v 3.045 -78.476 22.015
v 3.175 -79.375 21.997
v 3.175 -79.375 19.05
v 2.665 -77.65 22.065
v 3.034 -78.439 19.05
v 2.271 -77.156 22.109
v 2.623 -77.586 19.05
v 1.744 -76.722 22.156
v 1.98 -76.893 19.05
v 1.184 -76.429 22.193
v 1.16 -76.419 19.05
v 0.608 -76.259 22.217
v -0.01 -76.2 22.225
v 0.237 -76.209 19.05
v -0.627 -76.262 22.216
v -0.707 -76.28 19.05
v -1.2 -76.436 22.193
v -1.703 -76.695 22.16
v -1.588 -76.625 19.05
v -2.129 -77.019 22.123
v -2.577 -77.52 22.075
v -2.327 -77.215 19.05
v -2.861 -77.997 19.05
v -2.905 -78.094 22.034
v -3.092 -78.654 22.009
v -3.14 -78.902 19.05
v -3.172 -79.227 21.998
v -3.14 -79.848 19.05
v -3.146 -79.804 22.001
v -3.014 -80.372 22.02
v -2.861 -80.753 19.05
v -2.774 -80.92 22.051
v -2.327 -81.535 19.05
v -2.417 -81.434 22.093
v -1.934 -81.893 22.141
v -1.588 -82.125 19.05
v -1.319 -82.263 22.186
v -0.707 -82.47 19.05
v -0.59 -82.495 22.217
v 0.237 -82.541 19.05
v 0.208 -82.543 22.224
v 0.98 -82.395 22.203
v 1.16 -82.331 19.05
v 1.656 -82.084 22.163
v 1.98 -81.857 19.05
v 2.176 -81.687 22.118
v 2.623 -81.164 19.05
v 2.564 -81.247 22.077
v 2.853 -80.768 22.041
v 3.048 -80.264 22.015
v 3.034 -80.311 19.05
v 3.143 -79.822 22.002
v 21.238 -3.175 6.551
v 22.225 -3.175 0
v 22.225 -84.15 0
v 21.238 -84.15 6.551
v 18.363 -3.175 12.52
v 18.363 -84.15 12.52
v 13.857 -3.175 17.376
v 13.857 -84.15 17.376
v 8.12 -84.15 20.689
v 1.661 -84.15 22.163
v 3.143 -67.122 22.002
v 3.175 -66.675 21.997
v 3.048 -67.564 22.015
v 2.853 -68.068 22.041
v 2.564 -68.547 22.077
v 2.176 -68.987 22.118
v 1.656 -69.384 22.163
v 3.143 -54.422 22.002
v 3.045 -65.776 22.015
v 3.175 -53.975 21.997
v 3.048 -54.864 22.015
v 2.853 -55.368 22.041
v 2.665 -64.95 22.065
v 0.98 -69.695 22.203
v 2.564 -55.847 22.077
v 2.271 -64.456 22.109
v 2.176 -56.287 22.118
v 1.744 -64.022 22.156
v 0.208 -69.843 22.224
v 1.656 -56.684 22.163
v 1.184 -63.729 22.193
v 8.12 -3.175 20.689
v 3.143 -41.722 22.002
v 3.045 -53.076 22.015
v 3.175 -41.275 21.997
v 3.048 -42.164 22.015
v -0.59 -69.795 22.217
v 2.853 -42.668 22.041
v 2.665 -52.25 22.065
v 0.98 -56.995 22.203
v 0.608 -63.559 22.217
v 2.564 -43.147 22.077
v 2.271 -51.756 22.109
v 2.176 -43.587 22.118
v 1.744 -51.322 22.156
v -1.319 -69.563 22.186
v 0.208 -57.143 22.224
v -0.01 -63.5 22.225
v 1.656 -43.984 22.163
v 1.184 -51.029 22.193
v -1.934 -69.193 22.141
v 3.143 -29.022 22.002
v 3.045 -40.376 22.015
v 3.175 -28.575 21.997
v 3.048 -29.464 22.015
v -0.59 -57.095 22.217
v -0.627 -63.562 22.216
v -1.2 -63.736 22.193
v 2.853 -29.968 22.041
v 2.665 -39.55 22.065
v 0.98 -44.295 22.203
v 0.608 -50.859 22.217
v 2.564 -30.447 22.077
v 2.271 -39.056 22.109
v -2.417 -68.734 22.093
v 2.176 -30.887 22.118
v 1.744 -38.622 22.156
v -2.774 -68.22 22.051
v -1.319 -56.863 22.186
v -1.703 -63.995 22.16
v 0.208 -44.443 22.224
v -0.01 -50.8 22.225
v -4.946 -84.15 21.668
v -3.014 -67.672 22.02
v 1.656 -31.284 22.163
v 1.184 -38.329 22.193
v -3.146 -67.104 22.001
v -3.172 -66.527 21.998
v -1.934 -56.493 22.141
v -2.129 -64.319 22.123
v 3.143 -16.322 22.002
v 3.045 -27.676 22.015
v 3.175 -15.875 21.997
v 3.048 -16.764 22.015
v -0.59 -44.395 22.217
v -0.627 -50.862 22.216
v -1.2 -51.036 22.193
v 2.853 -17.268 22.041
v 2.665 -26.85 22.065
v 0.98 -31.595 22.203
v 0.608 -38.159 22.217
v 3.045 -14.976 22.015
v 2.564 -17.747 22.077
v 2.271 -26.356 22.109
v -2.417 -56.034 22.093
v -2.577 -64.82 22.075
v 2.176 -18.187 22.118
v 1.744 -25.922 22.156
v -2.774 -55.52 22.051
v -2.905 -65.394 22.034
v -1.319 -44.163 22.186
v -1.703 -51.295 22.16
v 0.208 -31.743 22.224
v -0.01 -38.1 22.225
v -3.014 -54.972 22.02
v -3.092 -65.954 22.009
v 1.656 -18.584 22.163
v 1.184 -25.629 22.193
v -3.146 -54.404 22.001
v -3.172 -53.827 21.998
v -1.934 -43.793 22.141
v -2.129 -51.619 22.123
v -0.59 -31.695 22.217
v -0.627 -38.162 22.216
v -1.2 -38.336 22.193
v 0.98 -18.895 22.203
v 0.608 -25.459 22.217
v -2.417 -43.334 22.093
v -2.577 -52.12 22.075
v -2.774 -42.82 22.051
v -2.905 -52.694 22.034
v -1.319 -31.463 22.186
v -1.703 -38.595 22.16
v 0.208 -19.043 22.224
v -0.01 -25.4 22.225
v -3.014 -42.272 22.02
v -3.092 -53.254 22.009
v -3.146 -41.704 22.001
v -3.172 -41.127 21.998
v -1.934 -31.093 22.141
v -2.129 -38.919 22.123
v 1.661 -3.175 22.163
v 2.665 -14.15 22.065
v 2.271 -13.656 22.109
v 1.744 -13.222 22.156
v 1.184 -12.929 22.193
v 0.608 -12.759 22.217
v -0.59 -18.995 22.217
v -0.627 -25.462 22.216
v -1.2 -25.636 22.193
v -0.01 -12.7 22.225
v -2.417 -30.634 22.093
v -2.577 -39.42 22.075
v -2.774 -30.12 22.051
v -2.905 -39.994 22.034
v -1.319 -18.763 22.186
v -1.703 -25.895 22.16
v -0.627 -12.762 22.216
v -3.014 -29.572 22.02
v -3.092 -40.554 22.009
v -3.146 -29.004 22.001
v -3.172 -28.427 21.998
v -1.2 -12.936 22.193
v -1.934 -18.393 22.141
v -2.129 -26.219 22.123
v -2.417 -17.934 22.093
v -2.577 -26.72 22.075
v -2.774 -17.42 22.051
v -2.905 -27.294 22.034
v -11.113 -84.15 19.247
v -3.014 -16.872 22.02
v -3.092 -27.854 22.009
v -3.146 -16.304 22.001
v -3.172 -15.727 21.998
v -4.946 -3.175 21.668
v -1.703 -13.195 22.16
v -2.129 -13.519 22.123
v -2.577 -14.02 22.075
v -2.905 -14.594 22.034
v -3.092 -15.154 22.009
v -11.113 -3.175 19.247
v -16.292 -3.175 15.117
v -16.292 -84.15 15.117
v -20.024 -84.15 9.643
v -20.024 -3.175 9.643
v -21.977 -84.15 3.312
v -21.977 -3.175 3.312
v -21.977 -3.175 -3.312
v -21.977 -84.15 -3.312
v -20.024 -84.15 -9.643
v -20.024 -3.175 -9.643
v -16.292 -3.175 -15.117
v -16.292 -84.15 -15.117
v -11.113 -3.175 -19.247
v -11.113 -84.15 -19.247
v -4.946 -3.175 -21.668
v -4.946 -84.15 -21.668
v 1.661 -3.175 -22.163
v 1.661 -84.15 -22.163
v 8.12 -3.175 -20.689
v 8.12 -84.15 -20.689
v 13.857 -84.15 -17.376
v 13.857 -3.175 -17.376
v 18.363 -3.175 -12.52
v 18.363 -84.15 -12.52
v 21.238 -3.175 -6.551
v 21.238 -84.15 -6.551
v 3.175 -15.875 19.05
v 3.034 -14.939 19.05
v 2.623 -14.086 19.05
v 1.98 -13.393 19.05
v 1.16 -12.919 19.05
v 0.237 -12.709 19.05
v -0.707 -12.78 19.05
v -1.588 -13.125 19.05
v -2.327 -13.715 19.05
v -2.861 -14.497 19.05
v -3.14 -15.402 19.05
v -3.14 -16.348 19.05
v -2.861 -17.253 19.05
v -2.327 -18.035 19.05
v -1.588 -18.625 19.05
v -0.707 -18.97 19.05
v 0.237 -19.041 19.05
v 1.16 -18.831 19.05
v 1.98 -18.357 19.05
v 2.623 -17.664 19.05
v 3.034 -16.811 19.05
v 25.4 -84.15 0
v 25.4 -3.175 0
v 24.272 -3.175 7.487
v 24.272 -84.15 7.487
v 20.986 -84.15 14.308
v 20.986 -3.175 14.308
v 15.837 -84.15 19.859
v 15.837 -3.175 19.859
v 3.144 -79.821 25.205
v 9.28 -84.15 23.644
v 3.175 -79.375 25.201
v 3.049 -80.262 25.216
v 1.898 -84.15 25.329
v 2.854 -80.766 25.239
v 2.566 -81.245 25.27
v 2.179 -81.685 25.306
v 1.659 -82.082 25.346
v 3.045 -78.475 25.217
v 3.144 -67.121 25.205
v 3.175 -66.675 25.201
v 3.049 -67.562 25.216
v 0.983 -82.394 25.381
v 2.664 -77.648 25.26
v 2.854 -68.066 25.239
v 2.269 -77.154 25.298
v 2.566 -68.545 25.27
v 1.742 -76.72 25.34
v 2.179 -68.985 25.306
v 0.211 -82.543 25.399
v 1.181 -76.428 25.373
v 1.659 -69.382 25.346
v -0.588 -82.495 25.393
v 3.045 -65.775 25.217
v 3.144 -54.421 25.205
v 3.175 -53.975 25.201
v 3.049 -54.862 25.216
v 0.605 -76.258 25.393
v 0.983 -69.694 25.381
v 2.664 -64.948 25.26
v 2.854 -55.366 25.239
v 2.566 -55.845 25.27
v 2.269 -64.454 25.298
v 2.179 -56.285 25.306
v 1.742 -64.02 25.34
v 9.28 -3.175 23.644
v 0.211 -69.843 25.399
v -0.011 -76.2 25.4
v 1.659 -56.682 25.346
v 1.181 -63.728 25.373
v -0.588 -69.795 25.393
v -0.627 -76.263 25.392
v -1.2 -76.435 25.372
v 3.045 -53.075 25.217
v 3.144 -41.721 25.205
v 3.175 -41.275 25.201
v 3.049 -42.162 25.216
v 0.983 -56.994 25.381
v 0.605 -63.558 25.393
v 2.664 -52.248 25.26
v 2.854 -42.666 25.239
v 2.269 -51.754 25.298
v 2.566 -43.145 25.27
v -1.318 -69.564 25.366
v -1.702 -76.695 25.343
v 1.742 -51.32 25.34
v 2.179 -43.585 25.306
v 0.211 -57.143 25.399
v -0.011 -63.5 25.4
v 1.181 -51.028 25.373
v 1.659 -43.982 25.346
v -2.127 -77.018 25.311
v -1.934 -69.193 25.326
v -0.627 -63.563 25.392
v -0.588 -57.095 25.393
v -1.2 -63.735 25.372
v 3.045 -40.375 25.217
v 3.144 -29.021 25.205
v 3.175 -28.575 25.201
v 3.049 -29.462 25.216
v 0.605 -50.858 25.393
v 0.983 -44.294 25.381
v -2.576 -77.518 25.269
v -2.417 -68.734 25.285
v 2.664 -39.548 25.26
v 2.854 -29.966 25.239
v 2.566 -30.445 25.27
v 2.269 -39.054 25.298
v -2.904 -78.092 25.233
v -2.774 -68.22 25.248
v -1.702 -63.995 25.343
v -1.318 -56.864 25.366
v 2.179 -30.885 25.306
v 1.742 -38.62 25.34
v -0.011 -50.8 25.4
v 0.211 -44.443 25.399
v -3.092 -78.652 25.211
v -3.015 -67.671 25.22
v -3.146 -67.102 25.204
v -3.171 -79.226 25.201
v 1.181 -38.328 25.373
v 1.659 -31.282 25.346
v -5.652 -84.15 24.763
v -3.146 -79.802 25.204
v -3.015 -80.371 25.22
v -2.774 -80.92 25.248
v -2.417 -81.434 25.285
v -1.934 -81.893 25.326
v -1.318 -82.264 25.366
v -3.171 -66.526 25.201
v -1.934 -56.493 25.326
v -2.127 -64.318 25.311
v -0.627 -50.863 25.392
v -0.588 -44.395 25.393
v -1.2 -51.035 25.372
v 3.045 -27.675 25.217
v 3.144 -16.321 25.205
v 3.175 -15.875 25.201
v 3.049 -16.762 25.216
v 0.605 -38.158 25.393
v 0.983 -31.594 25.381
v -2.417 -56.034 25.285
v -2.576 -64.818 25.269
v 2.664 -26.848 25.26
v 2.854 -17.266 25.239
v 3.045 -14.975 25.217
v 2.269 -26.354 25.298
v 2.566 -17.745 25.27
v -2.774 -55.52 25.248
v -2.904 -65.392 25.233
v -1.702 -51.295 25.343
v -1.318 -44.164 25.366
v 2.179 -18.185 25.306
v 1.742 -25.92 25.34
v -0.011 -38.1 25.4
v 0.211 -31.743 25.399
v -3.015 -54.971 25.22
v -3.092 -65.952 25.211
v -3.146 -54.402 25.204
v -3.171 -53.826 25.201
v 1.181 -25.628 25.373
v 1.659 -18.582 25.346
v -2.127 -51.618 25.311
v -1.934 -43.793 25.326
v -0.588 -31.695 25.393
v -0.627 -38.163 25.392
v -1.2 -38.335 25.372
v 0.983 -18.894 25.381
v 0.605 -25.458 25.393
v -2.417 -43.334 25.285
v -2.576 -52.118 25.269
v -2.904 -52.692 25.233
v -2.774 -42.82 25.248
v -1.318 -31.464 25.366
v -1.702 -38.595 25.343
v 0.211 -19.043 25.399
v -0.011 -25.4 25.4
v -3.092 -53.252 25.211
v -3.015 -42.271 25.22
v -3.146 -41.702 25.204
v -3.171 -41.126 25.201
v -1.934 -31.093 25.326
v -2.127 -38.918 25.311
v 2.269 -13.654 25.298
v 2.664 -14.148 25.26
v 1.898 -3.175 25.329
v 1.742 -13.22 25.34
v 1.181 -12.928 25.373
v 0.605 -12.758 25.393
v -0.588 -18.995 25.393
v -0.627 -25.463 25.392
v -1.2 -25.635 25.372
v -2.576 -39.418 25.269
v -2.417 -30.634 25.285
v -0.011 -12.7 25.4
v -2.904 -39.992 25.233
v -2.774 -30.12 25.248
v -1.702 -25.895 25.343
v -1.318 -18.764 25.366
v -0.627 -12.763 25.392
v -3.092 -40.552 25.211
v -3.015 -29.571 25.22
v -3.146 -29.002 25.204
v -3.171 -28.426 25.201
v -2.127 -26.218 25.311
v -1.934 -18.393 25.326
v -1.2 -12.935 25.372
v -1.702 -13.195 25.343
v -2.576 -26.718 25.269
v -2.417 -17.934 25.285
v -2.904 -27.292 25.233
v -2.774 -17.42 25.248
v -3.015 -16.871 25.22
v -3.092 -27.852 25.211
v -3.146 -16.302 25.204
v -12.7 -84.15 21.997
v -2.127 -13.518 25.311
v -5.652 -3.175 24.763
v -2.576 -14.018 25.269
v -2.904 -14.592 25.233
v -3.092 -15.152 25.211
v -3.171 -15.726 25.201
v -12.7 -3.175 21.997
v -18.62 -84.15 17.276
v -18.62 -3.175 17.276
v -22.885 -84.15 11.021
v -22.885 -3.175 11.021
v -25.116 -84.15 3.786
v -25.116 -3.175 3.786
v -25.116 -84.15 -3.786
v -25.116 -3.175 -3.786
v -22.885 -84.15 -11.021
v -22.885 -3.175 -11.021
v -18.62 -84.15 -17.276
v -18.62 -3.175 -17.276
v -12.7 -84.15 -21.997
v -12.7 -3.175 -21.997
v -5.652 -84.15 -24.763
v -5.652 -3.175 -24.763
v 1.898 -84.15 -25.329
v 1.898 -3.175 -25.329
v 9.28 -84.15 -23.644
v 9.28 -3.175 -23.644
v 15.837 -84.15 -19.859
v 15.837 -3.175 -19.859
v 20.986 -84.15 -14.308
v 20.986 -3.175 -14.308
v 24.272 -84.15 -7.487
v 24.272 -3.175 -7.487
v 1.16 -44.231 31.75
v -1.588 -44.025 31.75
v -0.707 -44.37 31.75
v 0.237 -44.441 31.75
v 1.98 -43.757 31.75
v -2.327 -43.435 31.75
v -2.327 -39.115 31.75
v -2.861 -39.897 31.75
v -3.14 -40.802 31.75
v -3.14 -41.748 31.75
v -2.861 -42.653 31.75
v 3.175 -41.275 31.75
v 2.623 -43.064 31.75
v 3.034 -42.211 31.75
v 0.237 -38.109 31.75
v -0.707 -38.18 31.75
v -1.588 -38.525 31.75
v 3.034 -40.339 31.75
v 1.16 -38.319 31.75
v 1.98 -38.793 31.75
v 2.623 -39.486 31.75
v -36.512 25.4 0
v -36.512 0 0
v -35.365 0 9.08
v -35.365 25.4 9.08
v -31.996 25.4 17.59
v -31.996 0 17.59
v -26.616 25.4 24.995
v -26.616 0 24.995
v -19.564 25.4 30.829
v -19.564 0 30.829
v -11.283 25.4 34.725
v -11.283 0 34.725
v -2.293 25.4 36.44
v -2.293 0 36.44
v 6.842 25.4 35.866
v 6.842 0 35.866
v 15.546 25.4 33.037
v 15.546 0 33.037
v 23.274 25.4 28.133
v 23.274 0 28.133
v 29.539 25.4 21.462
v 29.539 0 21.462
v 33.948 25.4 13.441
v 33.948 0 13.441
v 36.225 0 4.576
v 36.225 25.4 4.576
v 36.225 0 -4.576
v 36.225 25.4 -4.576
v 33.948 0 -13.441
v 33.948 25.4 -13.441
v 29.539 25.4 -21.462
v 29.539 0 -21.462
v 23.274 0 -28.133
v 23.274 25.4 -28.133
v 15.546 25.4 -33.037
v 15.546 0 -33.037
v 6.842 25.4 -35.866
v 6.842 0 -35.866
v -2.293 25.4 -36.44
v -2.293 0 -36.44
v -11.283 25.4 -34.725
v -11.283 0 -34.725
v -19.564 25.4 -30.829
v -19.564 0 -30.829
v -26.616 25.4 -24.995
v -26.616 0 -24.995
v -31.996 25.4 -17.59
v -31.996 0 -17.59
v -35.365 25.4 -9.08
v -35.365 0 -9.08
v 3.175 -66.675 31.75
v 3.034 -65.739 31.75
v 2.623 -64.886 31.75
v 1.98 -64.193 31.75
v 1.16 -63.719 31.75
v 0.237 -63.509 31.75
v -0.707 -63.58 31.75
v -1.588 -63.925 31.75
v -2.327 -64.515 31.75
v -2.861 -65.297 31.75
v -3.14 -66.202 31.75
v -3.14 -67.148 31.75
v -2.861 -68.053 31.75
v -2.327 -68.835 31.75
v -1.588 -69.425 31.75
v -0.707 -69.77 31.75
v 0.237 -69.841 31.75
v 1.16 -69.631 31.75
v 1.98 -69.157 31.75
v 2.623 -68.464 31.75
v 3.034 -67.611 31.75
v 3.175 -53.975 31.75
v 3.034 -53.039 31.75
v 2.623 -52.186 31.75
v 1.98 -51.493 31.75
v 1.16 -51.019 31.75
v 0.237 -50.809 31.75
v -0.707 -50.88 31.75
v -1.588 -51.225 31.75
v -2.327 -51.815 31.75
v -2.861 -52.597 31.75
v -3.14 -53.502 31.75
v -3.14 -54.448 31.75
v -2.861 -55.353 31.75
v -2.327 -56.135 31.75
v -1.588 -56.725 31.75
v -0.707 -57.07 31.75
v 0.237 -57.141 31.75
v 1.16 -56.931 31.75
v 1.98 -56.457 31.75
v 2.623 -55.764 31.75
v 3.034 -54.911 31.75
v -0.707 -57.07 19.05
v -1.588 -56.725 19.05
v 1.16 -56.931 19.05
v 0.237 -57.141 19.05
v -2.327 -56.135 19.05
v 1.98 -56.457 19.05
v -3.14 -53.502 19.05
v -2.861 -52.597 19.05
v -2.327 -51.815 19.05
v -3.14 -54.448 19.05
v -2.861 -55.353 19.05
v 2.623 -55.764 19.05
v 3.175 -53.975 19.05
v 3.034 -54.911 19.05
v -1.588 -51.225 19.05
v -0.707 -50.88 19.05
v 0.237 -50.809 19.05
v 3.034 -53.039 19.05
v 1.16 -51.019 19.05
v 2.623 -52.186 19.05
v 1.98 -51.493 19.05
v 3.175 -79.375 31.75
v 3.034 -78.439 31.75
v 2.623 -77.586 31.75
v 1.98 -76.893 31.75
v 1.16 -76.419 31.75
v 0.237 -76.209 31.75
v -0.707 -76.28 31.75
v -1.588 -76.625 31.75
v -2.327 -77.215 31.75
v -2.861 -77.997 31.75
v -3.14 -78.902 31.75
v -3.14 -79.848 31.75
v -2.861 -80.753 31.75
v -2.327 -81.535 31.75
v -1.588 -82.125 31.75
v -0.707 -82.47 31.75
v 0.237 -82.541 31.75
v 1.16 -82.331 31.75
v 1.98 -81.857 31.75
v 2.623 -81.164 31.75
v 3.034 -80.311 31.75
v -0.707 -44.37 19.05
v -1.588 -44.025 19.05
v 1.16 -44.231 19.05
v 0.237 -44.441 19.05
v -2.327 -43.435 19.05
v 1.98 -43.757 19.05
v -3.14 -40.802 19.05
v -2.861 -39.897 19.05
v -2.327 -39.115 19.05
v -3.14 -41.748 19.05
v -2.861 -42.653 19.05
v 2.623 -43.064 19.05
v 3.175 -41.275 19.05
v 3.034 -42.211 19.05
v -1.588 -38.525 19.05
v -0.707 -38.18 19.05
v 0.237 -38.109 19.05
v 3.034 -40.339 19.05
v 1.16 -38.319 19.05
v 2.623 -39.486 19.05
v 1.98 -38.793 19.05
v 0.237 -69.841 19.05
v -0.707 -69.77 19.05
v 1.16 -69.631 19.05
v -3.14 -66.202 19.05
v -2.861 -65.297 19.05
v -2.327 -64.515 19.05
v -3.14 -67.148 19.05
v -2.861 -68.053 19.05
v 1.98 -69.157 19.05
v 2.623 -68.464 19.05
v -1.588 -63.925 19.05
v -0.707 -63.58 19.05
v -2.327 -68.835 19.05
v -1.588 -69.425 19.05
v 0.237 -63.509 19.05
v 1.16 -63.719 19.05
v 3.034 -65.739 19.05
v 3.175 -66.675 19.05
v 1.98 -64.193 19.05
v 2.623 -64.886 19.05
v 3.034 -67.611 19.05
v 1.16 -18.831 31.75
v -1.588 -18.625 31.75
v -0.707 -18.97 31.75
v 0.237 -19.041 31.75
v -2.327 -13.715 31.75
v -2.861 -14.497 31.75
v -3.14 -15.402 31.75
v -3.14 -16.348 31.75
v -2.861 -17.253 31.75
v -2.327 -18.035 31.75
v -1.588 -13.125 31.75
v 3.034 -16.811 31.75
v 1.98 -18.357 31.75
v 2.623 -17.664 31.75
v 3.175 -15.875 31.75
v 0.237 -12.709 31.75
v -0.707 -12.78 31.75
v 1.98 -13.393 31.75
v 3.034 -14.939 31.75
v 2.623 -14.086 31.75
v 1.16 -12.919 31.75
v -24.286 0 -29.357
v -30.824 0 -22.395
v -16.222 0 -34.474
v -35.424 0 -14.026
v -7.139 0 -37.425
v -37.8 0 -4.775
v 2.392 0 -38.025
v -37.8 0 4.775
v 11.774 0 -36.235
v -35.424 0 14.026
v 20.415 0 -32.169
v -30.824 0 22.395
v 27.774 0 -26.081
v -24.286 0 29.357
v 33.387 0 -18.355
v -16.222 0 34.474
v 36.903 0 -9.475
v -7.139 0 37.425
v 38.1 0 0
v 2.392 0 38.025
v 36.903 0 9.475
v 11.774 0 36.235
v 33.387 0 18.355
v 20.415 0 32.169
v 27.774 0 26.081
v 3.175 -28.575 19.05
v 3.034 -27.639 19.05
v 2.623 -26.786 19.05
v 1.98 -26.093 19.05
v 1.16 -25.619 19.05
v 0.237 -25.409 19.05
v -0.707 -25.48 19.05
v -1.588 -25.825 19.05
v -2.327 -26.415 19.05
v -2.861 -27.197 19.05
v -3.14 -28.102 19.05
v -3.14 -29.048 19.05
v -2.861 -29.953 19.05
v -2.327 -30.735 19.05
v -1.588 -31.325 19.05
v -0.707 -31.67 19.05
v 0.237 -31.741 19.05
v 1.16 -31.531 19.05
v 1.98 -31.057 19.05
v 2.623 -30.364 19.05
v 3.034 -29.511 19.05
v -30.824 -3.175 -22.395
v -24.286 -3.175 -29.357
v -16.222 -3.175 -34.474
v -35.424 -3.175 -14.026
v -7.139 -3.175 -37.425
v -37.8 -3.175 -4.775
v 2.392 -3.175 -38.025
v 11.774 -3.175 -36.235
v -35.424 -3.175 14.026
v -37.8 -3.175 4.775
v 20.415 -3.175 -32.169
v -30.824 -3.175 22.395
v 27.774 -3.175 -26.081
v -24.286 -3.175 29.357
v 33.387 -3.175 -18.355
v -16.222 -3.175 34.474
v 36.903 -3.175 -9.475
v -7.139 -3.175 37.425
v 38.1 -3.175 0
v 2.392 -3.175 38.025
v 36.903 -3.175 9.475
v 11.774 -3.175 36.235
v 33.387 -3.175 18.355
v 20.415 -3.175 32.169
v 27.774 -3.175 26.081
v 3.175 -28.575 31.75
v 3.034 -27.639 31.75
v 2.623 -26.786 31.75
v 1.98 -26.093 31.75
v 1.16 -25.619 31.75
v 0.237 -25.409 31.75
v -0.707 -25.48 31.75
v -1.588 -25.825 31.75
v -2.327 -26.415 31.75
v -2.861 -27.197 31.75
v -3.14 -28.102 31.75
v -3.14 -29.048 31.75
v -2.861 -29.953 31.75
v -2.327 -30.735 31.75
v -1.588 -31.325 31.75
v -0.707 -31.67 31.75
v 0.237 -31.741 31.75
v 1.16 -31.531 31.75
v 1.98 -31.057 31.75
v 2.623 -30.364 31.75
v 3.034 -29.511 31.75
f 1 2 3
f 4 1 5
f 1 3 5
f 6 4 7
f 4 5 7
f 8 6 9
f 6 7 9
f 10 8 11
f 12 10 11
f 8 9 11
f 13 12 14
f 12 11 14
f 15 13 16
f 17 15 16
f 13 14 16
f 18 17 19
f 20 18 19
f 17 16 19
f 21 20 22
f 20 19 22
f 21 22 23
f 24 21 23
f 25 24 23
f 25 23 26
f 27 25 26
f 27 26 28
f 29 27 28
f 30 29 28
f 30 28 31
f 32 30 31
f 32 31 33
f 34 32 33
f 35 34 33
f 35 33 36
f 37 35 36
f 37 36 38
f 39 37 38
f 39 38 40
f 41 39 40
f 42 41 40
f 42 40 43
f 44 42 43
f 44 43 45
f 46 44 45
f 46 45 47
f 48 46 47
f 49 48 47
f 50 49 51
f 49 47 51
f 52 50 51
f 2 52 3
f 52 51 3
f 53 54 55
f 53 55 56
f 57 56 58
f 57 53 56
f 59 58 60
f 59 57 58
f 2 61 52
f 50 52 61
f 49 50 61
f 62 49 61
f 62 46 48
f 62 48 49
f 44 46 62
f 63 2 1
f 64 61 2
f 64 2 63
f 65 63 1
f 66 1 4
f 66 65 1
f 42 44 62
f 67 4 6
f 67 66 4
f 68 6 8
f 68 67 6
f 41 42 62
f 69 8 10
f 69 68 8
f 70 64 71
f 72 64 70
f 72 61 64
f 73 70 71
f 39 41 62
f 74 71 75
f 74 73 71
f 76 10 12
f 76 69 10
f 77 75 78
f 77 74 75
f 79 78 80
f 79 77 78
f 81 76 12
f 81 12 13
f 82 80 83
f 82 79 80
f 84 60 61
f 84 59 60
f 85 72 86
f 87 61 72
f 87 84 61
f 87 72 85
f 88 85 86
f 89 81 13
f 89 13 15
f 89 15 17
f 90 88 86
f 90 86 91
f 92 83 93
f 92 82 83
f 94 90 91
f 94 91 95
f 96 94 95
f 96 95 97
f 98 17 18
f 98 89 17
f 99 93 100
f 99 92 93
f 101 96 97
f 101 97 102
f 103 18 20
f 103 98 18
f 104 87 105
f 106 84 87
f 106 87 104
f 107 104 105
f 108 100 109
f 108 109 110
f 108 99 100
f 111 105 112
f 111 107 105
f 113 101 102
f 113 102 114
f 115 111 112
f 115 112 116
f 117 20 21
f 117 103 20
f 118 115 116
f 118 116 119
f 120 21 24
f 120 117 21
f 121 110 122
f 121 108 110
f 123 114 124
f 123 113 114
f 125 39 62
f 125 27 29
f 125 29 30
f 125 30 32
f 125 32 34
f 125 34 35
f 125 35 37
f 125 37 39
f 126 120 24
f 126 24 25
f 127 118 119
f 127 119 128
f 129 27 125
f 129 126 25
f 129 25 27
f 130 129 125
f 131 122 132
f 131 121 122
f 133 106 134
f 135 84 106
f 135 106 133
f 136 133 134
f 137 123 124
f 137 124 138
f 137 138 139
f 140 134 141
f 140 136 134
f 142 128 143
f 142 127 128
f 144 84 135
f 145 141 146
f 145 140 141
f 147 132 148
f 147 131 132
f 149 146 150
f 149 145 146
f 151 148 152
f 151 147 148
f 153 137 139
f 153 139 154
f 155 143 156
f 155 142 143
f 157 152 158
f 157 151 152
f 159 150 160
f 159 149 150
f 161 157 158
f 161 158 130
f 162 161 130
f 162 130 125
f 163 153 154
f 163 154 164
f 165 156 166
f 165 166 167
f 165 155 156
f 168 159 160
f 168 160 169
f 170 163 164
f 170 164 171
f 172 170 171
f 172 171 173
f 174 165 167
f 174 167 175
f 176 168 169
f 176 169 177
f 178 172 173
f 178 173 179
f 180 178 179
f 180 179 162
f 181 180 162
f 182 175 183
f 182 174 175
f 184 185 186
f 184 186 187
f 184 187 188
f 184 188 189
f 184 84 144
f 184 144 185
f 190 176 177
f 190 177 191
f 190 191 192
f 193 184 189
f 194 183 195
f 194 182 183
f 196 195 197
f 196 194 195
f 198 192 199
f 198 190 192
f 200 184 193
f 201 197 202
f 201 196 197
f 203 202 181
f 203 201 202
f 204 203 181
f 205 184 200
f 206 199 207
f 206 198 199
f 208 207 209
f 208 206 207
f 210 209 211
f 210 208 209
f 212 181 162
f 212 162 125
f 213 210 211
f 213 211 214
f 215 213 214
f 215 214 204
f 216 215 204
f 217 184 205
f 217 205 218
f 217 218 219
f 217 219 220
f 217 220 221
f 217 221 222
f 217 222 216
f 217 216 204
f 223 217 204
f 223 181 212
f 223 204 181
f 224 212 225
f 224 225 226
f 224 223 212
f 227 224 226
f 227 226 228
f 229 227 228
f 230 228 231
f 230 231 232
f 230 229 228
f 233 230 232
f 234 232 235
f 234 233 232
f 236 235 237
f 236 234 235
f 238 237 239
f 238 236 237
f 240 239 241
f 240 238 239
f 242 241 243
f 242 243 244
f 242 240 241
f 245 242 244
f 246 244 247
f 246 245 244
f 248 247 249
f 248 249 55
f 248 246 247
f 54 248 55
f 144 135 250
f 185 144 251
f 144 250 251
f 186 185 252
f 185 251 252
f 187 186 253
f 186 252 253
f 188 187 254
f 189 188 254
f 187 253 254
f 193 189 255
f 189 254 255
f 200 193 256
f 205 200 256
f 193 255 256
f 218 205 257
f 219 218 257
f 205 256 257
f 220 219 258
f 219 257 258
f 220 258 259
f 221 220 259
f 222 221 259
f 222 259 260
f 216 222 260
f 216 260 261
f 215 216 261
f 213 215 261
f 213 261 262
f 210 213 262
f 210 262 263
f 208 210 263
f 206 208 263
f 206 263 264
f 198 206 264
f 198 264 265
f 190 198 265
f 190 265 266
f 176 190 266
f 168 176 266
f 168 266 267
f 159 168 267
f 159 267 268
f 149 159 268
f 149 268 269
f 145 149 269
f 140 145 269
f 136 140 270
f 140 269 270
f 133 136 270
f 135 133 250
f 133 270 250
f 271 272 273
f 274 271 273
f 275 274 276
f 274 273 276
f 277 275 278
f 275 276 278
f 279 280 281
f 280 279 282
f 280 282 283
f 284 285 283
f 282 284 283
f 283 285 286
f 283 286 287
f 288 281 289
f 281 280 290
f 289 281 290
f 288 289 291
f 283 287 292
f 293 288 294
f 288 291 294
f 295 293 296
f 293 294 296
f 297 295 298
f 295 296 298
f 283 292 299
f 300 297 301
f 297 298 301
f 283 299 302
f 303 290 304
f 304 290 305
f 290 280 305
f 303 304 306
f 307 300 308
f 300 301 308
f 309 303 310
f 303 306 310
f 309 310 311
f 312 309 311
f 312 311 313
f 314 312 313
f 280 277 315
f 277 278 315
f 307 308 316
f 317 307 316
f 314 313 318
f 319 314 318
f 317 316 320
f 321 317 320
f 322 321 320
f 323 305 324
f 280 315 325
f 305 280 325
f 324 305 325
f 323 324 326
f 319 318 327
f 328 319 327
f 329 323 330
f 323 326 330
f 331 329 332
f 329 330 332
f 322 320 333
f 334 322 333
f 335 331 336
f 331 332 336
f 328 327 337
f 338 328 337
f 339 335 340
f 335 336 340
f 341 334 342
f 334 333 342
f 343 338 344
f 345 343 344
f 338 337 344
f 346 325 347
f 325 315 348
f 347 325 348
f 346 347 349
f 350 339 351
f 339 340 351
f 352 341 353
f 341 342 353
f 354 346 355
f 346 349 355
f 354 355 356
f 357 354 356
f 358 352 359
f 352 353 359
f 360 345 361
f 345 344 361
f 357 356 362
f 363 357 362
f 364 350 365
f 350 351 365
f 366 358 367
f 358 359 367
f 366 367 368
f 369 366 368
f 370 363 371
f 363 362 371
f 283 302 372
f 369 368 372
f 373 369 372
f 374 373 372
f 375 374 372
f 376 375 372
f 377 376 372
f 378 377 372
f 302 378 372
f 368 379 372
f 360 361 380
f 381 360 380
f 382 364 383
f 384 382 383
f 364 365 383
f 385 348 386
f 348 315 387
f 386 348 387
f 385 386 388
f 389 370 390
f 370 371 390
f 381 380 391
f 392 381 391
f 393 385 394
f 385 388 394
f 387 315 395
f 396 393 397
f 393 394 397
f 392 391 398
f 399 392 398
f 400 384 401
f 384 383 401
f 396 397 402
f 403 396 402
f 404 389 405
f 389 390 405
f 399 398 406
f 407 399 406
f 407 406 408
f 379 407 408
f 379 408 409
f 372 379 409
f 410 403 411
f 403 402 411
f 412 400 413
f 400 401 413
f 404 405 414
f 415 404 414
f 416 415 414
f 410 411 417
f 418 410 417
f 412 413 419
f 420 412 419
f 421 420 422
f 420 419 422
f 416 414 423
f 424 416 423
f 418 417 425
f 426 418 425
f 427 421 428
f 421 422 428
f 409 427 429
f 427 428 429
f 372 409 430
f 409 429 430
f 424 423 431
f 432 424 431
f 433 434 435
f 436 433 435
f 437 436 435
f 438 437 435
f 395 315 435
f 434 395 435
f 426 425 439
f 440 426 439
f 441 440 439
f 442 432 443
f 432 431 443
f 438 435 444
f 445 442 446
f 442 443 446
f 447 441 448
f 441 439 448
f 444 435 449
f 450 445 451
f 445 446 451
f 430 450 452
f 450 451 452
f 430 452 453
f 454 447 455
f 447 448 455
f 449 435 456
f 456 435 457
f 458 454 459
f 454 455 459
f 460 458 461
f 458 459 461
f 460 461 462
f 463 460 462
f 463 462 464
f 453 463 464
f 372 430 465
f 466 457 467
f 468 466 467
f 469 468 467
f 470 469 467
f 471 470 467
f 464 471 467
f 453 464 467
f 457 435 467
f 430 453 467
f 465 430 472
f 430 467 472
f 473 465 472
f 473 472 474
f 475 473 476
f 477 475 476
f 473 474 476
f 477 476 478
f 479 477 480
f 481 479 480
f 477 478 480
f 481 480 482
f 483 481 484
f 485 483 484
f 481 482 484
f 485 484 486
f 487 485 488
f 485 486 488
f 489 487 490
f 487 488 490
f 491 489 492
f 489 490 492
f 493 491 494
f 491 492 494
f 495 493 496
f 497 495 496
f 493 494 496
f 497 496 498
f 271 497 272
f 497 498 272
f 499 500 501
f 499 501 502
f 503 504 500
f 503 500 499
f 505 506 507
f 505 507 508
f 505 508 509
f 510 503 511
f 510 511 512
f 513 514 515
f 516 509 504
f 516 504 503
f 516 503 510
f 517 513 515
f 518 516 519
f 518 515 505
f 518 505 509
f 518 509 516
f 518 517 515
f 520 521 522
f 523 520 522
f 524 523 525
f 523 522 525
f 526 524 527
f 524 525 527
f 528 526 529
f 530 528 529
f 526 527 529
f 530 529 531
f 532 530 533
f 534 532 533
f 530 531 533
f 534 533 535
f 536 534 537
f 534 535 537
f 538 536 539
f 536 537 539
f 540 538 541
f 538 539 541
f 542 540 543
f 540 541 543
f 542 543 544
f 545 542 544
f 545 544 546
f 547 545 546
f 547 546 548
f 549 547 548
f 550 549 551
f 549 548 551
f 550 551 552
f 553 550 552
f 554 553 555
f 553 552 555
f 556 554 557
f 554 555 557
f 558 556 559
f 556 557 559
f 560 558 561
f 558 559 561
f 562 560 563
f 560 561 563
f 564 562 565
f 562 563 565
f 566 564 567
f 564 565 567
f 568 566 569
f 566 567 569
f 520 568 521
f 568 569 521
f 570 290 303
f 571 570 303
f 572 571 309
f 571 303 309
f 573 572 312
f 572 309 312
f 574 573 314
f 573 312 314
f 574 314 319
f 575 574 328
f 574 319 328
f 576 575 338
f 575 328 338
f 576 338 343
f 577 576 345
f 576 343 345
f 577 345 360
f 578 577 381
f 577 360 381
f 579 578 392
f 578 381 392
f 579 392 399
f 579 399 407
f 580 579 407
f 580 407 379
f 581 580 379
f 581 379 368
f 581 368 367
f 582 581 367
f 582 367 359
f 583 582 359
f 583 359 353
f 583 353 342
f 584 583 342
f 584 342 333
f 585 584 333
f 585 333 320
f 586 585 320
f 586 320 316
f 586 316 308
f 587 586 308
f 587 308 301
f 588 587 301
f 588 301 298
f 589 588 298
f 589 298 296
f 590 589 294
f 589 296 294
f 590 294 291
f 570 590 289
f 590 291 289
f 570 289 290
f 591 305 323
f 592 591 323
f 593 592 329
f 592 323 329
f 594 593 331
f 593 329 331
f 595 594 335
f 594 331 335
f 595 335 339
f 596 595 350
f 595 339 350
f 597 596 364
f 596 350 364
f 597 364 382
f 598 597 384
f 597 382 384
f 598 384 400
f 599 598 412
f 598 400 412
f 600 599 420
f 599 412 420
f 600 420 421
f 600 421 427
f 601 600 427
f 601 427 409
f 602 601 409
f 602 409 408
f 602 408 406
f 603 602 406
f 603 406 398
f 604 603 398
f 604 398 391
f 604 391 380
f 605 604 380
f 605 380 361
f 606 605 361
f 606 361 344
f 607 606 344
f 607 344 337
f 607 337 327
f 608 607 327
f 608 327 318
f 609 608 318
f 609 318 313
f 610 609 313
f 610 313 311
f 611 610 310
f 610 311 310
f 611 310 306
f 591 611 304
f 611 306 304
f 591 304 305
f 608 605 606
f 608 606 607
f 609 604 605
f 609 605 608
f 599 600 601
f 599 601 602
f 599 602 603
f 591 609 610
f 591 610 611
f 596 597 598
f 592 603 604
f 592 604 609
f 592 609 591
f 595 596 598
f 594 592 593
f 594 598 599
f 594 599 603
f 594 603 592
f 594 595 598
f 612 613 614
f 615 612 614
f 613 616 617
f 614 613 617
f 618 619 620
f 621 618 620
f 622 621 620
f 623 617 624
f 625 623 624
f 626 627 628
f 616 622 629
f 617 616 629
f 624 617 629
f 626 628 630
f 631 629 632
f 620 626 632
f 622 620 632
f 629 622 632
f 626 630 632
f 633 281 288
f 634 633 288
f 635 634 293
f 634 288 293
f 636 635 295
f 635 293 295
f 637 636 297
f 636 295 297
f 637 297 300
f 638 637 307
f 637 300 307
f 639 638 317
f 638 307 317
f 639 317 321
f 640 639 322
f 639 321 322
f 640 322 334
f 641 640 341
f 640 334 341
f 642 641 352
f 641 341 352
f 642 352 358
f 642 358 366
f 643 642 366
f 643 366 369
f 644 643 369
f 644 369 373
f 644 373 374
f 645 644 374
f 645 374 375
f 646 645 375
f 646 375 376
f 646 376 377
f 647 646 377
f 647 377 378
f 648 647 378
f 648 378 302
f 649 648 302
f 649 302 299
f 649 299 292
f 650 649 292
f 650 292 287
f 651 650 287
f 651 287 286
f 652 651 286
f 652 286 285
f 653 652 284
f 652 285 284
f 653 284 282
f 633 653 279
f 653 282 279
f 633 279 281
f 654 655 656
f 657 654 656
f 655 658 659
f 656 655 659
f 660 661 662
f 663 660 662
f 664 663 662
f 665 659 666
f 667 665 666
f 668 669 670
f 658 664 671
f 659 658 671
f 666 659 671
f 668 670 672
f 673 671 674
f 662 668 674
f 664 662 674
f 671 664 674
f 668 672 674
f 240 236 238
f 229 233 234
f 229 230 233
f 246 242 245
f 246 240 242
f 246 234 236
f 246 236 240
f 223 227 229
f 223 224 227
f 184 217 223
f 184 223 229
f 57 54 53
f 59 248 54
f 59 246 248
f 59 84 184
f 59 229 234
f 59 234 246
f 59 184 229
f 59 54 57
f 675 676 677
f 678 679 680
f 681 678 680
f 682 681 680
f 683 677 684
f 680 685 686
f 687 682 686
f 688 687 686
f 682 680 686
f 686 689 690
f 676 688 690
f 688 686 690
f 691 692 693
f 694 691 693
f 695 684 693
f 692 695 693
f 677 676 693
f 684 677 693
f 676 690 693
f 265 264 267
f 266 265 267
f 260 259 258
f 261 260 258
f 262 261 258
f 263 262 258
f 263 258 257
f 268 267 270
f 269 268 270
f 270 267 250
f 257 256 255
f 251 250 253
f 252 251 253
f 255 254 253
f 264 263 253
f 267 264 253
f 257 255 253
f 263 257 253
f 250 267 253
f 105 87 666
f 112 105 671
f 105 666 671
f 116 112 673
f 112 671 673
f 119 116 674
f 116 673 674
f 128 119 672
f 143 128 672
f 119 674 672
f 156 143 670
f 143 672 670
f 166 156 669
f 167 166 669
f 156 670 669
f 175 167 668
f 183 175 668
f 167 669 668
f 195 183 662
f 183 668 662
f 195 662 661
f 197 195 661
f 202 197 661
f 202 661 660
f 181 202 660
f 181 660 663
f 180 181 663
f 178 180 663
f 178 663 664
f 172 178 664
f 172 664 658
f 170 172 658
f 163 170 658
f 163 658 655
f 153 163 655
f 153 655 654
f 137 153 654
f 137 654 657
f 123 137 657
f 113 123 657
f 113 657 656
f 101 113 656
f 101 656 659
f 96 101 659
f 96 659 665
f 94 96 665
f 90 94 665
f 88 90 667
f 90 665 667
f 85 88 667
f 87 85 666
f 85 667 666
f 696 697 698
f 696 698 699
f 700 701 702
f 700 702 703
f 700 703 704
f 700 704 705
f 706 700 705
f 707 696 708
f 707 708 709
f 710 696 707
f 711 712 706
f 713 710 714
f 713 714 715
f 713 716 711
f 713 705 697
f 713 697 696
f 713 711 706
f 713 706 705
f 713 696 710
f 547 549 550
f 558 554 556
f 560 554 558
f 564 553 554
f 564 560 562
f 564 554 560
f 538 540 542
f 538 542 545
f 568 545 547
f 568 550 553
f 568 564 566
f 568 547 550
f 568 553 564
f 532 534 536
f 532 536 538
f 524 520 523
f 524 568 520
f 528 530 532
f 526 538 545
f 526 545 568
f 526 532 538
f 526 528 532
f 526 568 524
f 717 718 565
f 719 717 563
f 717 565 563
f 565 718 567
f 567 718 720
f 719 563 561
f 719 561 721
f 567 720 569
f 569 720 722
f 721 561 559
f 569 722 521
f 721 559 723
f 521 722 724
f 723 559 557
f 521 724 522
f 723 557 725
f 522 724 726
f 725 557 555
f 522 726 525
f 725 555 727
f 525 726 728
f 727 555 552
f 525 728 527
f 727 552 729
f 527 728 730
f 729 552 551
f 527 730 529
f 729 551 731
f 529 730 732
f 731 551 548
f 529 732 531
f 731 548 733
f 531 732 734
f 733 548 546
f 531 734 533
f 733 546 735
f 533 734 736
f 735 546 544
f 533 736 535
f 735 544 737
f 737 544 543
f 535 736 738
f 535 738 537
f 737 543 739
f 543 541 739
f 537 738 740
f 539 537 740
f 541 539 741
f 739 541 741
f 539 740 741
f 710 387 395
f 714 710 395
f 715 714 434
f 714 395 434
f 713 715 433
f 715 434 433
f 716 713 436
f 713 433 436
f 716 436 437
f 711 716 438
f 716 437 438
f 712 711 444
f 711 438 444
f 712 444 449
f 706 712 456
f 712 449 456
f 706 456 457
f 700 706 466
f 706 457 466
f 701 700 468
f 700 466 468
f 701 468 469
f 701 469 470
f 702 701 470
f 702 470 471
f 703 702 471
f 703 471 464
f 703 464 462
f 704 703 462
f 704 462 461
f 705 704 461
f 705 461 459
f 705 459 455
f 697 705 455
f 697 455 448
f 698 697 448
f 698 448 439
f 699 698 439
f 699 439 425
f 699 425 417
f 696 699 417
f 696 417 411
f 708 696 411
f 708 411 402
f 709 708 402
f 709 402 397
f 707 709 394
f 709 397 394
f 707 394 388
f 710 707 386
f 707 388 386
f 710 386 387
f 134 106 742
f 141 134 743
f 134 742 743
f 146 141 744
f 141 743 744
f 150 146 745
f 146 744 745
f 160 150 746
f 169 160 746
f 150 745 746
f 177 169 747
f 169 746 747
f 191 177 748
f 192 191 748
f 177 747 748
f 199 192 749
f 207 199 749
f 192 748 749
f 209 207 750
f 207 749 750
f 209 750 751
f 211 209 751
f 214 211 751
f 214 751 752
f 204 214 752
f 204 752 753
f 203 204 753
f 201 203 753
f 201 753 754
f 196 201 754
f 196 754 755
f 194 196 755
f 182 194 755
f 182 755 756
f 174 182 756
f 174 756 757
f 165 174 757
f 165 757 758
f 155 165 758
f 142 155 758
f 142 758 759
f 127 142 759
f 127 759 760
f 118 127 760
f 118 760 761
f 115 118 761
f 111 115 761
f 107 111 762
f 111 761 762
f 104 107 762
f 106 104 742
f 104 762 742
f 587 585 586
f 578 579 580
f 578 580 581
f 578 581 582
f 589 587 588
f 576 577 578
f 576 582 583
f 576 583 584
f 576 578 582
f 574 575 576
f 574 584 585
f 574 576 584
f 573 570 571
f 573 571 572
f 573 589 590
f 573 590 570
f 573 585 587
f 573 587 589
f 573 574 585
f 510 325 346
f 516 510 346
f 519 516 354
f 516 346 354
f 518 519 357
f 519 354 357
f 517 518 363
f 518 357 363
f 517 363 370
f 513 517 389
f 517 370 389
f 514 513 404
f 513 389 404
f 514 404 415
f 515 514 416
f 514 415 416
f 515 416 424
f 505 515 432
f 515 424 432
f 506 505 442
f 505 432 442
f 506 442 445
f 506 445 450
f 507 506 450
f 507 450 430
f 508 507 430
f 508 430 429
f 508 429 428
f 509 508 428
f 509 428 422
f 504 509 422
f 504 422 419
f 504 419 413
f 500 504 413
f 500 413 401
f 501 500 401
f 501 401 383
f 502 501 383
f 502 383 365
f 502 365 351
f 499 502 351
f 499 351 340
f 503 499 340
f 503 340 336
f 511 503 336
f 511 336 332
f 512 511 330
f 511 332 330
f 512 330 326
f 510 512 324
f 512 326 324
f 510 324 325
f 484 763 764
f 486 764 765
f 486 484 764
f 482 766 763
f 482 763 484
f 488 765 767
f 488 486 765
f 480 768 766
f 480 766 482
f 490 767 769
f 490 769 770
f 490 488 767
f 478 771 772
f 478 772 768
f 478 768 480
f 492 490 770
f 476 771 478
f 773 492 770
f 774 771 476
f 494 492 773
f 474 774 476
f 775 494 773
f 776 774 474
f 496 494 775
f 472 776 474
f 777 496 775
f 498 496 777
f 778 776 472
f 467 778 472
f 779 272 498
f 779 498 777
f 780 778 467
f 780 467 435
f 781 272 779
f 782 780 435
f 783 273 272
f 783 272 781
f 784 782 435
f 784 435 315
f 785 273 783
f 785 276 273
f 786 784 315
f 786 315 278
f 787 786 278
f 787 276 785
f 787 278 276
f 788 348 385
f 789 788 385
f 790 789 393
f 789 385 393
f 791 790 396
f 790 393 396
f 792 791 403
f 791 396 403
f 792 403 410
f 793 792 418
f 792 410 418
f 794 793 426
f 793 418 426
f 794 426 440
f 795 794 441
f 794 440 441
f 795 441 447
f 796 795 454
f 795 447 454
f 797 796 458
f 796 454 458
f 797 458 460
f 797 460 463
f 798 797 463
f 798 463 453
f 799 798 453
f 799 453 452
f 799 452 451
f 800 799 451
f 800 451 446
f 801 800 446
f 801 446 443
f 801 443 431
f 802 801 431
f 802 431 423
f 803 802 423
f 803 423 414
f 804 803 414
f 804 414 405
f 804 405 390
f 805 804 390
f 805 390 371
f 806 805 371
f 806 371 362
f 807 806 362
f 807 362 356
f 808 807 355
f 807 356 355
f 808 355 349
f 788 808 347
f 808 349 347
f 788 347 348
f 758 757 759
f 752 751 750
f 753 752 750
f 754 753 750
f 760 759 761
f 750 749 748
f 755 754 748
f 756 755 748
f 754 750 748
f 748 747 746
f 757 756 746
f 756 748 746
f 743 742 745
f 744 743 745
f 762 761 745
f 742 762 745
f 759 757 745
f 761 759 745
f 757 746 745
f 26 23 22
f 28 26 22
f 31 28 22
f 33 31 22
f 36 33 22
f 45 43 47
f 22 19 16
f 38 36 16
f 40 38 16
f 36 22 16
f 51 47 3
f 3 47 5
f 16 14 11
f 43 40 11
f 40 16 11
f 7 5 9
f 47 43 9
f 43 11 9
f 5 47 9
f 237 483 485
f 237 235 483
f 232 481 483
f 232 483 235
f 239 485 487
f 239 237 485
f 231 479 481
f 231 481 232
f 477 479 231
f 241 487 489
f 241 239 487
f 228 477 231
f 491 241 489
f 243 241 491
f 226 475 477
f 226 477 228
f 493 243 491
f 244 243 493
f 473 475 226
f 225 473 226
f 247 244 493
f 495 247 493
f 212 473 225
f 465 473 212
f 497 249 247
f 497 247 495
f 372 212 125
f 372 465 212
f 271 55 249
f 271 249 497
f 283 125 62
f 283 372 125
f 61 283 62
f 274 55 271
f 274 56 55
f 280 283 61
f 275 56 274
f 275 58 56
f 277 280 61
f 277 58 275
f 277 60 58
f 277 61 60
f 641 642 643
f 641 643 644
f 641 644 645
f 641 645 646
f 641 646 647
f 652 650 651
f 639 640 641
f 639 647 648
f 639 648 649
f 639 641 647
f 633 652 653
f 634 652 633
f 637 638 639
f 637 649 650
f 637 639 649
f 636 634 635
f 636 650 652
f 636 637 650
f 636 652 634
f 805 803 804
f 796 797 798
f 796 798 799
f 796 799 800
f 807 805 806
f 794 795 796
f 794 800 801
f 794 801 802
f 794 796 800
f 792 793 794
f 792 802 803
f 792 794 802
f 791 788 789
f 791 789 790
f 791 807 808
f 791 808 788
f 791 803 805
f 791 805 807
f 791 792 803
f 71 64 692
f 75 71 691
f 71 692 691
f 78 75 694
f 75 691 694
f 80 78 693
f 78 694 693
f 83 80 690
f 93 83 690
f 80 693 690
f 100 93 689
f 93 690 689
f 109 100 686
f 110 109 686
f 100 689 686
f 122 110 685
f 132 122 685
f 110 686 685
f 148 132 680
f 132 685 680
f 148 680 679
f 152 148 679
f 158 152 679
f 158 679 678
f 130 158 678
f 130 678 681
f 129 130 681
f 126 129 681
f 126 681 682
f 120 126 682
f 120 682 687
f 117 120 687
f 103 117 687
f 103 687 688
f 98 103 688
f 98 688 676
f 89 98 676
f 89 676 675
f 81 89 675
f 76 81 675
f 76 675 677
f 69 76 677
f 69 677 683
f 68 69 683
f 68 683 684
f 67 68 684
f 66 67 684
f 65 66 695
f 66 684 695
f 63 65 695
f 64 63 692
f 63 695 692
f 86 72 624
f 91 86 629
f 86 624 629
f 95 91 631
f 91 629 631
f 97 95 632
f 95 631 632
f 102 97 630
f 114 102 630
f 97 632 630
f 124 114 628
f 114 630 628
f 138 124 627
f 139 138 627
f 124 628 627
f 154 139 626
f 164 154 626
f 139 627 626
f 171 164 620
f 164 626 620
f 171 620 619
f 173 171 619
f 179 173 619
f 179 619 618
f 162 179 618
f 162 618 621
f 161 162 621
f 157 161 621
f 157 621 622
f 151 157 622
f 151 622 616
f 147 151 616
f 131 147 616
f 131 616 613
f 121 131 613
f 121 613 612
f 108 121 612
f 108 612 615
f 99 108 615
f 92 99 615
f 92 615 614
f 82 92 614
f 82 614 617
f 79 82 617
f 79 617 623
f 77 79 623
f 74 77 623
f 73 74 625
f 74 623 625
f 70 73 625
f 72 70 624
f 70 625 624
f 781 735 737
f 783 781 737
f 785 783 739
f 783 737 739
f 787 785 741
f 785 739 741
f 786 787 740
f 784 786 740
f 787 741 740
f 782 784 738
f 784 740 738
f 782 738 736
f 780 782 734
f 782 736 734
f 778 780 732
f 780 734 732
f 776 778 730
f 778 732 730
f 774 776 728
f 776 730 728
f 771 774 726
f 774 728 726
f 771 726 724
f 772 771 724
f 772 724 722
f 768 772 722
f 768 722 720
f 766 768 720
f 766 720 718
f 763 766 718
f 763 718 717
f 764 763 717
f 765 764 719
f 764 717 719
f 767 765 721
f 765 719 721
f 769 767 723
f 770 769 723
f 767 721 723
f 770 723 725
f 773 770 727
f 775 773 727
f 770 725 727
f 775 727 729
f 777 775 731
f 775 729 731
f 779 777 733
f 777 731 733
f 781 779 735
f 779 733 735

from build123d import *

# Parameters (mm, degrees)
F0_R     = 25.4
F0_R_2   = 22.225
F1_DEPTH = 84.1502
F2_R     = 38.1
F3_DEPTH = 3.175
F4_R     = 36.5125
F5_DEPTH = 25.4
F7_R     = 3.175
F8_DEPTH = 12.7


with BuildPart() as f1:
    # F0 (on Front) → F1 (new body)
    with BuildSketch(Plane.XZ):
        Circle(F0_R)
        Circle(F0_R_2, mode=Mode.SUBTRACT)
    extrude(amount=F1_DEPTH)

    # F2 (on Front) → F3 (join)
    with BuildSketch(Plane.XZ):
        Circle(F2_R)
    extrude(amount=F3_DEPTH)

    # F4 (on face) → F5 (join)
    with BuildSketch(Plane(origin=(0, 0, 0), x_dir=(-1, 0, 0), z_dir=(0, 1, 0))):
        Circle(F4_R)
    extrude(amount=F5_DEPTH)

    # F7 (on offset) → F8 (join)
    with BuildSketch(Plane.XY.offset(19.05)):
        with Locations((0, -15.875)):
            Circle(F7_R)
        with Locations((0, -28.575)):
            Circle(F7_R)
        with Locations((0, -41.275)):
            Circle(F7_R)
        with Locations((0, -53.975)):
            Circle(F7_R)
        with Locations((0, -66.675)):
            Circle(F7_R)
        with Locations((0, -79.375)):
            Circle(F7_R)
    extrude(amount=F8_DEPTH)


solid = f1.part
